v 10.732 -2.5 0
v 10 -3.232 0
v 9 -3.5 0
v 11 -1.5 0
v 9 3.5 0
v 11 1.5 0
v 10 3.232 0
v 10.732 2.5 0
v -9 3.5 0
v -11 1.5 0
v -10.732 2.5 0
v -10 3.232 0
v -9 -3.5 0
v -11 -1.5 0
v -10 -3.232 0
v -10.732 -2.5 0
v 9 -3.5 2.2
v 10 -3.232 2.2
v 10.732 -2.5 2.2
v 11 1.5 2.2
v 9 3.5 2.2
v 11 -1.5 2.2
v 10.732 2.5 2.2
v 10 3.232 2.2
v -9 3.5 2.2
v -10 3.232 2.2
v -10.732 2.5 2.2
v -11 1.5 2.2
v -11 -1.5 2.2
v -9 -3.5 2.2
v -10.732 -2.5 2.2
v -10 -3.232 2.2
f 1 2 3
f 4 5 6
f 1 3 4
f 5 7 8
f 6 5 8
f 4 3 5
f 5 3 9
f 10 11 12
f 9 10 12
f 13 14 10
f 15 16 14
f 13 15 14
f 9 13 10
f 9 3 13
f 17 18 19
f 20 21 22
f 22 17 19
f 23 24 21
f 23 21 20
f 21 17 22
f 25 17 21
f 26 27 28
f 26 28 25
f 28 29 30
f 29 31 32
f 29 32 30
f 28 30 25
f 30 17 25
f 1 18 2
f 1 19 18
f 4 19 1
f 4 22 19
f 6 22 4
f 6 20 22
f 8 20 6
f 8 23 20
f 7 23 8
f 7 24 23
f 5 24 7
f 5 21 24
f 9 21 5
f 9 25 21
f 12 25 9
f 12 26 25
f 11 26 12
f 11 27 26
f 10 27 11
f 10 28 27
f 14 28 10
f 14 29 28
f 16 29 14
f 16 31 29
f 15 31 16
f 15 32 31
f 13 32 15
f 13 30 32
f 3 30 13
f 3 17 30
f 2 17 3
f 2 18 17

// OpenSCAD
domino_length = 22;
domino_width = 7;
domino_height = 2.2;

module domino_key() {
    rounded = min(domino_width / 2, 2);
    linear_extrude(height = domino_height)
        offset(r = rounded, $fn = 12)
            offset(delta = -rounded)
                square([domino_length, domino_width], center = true);
}

domino_key();
